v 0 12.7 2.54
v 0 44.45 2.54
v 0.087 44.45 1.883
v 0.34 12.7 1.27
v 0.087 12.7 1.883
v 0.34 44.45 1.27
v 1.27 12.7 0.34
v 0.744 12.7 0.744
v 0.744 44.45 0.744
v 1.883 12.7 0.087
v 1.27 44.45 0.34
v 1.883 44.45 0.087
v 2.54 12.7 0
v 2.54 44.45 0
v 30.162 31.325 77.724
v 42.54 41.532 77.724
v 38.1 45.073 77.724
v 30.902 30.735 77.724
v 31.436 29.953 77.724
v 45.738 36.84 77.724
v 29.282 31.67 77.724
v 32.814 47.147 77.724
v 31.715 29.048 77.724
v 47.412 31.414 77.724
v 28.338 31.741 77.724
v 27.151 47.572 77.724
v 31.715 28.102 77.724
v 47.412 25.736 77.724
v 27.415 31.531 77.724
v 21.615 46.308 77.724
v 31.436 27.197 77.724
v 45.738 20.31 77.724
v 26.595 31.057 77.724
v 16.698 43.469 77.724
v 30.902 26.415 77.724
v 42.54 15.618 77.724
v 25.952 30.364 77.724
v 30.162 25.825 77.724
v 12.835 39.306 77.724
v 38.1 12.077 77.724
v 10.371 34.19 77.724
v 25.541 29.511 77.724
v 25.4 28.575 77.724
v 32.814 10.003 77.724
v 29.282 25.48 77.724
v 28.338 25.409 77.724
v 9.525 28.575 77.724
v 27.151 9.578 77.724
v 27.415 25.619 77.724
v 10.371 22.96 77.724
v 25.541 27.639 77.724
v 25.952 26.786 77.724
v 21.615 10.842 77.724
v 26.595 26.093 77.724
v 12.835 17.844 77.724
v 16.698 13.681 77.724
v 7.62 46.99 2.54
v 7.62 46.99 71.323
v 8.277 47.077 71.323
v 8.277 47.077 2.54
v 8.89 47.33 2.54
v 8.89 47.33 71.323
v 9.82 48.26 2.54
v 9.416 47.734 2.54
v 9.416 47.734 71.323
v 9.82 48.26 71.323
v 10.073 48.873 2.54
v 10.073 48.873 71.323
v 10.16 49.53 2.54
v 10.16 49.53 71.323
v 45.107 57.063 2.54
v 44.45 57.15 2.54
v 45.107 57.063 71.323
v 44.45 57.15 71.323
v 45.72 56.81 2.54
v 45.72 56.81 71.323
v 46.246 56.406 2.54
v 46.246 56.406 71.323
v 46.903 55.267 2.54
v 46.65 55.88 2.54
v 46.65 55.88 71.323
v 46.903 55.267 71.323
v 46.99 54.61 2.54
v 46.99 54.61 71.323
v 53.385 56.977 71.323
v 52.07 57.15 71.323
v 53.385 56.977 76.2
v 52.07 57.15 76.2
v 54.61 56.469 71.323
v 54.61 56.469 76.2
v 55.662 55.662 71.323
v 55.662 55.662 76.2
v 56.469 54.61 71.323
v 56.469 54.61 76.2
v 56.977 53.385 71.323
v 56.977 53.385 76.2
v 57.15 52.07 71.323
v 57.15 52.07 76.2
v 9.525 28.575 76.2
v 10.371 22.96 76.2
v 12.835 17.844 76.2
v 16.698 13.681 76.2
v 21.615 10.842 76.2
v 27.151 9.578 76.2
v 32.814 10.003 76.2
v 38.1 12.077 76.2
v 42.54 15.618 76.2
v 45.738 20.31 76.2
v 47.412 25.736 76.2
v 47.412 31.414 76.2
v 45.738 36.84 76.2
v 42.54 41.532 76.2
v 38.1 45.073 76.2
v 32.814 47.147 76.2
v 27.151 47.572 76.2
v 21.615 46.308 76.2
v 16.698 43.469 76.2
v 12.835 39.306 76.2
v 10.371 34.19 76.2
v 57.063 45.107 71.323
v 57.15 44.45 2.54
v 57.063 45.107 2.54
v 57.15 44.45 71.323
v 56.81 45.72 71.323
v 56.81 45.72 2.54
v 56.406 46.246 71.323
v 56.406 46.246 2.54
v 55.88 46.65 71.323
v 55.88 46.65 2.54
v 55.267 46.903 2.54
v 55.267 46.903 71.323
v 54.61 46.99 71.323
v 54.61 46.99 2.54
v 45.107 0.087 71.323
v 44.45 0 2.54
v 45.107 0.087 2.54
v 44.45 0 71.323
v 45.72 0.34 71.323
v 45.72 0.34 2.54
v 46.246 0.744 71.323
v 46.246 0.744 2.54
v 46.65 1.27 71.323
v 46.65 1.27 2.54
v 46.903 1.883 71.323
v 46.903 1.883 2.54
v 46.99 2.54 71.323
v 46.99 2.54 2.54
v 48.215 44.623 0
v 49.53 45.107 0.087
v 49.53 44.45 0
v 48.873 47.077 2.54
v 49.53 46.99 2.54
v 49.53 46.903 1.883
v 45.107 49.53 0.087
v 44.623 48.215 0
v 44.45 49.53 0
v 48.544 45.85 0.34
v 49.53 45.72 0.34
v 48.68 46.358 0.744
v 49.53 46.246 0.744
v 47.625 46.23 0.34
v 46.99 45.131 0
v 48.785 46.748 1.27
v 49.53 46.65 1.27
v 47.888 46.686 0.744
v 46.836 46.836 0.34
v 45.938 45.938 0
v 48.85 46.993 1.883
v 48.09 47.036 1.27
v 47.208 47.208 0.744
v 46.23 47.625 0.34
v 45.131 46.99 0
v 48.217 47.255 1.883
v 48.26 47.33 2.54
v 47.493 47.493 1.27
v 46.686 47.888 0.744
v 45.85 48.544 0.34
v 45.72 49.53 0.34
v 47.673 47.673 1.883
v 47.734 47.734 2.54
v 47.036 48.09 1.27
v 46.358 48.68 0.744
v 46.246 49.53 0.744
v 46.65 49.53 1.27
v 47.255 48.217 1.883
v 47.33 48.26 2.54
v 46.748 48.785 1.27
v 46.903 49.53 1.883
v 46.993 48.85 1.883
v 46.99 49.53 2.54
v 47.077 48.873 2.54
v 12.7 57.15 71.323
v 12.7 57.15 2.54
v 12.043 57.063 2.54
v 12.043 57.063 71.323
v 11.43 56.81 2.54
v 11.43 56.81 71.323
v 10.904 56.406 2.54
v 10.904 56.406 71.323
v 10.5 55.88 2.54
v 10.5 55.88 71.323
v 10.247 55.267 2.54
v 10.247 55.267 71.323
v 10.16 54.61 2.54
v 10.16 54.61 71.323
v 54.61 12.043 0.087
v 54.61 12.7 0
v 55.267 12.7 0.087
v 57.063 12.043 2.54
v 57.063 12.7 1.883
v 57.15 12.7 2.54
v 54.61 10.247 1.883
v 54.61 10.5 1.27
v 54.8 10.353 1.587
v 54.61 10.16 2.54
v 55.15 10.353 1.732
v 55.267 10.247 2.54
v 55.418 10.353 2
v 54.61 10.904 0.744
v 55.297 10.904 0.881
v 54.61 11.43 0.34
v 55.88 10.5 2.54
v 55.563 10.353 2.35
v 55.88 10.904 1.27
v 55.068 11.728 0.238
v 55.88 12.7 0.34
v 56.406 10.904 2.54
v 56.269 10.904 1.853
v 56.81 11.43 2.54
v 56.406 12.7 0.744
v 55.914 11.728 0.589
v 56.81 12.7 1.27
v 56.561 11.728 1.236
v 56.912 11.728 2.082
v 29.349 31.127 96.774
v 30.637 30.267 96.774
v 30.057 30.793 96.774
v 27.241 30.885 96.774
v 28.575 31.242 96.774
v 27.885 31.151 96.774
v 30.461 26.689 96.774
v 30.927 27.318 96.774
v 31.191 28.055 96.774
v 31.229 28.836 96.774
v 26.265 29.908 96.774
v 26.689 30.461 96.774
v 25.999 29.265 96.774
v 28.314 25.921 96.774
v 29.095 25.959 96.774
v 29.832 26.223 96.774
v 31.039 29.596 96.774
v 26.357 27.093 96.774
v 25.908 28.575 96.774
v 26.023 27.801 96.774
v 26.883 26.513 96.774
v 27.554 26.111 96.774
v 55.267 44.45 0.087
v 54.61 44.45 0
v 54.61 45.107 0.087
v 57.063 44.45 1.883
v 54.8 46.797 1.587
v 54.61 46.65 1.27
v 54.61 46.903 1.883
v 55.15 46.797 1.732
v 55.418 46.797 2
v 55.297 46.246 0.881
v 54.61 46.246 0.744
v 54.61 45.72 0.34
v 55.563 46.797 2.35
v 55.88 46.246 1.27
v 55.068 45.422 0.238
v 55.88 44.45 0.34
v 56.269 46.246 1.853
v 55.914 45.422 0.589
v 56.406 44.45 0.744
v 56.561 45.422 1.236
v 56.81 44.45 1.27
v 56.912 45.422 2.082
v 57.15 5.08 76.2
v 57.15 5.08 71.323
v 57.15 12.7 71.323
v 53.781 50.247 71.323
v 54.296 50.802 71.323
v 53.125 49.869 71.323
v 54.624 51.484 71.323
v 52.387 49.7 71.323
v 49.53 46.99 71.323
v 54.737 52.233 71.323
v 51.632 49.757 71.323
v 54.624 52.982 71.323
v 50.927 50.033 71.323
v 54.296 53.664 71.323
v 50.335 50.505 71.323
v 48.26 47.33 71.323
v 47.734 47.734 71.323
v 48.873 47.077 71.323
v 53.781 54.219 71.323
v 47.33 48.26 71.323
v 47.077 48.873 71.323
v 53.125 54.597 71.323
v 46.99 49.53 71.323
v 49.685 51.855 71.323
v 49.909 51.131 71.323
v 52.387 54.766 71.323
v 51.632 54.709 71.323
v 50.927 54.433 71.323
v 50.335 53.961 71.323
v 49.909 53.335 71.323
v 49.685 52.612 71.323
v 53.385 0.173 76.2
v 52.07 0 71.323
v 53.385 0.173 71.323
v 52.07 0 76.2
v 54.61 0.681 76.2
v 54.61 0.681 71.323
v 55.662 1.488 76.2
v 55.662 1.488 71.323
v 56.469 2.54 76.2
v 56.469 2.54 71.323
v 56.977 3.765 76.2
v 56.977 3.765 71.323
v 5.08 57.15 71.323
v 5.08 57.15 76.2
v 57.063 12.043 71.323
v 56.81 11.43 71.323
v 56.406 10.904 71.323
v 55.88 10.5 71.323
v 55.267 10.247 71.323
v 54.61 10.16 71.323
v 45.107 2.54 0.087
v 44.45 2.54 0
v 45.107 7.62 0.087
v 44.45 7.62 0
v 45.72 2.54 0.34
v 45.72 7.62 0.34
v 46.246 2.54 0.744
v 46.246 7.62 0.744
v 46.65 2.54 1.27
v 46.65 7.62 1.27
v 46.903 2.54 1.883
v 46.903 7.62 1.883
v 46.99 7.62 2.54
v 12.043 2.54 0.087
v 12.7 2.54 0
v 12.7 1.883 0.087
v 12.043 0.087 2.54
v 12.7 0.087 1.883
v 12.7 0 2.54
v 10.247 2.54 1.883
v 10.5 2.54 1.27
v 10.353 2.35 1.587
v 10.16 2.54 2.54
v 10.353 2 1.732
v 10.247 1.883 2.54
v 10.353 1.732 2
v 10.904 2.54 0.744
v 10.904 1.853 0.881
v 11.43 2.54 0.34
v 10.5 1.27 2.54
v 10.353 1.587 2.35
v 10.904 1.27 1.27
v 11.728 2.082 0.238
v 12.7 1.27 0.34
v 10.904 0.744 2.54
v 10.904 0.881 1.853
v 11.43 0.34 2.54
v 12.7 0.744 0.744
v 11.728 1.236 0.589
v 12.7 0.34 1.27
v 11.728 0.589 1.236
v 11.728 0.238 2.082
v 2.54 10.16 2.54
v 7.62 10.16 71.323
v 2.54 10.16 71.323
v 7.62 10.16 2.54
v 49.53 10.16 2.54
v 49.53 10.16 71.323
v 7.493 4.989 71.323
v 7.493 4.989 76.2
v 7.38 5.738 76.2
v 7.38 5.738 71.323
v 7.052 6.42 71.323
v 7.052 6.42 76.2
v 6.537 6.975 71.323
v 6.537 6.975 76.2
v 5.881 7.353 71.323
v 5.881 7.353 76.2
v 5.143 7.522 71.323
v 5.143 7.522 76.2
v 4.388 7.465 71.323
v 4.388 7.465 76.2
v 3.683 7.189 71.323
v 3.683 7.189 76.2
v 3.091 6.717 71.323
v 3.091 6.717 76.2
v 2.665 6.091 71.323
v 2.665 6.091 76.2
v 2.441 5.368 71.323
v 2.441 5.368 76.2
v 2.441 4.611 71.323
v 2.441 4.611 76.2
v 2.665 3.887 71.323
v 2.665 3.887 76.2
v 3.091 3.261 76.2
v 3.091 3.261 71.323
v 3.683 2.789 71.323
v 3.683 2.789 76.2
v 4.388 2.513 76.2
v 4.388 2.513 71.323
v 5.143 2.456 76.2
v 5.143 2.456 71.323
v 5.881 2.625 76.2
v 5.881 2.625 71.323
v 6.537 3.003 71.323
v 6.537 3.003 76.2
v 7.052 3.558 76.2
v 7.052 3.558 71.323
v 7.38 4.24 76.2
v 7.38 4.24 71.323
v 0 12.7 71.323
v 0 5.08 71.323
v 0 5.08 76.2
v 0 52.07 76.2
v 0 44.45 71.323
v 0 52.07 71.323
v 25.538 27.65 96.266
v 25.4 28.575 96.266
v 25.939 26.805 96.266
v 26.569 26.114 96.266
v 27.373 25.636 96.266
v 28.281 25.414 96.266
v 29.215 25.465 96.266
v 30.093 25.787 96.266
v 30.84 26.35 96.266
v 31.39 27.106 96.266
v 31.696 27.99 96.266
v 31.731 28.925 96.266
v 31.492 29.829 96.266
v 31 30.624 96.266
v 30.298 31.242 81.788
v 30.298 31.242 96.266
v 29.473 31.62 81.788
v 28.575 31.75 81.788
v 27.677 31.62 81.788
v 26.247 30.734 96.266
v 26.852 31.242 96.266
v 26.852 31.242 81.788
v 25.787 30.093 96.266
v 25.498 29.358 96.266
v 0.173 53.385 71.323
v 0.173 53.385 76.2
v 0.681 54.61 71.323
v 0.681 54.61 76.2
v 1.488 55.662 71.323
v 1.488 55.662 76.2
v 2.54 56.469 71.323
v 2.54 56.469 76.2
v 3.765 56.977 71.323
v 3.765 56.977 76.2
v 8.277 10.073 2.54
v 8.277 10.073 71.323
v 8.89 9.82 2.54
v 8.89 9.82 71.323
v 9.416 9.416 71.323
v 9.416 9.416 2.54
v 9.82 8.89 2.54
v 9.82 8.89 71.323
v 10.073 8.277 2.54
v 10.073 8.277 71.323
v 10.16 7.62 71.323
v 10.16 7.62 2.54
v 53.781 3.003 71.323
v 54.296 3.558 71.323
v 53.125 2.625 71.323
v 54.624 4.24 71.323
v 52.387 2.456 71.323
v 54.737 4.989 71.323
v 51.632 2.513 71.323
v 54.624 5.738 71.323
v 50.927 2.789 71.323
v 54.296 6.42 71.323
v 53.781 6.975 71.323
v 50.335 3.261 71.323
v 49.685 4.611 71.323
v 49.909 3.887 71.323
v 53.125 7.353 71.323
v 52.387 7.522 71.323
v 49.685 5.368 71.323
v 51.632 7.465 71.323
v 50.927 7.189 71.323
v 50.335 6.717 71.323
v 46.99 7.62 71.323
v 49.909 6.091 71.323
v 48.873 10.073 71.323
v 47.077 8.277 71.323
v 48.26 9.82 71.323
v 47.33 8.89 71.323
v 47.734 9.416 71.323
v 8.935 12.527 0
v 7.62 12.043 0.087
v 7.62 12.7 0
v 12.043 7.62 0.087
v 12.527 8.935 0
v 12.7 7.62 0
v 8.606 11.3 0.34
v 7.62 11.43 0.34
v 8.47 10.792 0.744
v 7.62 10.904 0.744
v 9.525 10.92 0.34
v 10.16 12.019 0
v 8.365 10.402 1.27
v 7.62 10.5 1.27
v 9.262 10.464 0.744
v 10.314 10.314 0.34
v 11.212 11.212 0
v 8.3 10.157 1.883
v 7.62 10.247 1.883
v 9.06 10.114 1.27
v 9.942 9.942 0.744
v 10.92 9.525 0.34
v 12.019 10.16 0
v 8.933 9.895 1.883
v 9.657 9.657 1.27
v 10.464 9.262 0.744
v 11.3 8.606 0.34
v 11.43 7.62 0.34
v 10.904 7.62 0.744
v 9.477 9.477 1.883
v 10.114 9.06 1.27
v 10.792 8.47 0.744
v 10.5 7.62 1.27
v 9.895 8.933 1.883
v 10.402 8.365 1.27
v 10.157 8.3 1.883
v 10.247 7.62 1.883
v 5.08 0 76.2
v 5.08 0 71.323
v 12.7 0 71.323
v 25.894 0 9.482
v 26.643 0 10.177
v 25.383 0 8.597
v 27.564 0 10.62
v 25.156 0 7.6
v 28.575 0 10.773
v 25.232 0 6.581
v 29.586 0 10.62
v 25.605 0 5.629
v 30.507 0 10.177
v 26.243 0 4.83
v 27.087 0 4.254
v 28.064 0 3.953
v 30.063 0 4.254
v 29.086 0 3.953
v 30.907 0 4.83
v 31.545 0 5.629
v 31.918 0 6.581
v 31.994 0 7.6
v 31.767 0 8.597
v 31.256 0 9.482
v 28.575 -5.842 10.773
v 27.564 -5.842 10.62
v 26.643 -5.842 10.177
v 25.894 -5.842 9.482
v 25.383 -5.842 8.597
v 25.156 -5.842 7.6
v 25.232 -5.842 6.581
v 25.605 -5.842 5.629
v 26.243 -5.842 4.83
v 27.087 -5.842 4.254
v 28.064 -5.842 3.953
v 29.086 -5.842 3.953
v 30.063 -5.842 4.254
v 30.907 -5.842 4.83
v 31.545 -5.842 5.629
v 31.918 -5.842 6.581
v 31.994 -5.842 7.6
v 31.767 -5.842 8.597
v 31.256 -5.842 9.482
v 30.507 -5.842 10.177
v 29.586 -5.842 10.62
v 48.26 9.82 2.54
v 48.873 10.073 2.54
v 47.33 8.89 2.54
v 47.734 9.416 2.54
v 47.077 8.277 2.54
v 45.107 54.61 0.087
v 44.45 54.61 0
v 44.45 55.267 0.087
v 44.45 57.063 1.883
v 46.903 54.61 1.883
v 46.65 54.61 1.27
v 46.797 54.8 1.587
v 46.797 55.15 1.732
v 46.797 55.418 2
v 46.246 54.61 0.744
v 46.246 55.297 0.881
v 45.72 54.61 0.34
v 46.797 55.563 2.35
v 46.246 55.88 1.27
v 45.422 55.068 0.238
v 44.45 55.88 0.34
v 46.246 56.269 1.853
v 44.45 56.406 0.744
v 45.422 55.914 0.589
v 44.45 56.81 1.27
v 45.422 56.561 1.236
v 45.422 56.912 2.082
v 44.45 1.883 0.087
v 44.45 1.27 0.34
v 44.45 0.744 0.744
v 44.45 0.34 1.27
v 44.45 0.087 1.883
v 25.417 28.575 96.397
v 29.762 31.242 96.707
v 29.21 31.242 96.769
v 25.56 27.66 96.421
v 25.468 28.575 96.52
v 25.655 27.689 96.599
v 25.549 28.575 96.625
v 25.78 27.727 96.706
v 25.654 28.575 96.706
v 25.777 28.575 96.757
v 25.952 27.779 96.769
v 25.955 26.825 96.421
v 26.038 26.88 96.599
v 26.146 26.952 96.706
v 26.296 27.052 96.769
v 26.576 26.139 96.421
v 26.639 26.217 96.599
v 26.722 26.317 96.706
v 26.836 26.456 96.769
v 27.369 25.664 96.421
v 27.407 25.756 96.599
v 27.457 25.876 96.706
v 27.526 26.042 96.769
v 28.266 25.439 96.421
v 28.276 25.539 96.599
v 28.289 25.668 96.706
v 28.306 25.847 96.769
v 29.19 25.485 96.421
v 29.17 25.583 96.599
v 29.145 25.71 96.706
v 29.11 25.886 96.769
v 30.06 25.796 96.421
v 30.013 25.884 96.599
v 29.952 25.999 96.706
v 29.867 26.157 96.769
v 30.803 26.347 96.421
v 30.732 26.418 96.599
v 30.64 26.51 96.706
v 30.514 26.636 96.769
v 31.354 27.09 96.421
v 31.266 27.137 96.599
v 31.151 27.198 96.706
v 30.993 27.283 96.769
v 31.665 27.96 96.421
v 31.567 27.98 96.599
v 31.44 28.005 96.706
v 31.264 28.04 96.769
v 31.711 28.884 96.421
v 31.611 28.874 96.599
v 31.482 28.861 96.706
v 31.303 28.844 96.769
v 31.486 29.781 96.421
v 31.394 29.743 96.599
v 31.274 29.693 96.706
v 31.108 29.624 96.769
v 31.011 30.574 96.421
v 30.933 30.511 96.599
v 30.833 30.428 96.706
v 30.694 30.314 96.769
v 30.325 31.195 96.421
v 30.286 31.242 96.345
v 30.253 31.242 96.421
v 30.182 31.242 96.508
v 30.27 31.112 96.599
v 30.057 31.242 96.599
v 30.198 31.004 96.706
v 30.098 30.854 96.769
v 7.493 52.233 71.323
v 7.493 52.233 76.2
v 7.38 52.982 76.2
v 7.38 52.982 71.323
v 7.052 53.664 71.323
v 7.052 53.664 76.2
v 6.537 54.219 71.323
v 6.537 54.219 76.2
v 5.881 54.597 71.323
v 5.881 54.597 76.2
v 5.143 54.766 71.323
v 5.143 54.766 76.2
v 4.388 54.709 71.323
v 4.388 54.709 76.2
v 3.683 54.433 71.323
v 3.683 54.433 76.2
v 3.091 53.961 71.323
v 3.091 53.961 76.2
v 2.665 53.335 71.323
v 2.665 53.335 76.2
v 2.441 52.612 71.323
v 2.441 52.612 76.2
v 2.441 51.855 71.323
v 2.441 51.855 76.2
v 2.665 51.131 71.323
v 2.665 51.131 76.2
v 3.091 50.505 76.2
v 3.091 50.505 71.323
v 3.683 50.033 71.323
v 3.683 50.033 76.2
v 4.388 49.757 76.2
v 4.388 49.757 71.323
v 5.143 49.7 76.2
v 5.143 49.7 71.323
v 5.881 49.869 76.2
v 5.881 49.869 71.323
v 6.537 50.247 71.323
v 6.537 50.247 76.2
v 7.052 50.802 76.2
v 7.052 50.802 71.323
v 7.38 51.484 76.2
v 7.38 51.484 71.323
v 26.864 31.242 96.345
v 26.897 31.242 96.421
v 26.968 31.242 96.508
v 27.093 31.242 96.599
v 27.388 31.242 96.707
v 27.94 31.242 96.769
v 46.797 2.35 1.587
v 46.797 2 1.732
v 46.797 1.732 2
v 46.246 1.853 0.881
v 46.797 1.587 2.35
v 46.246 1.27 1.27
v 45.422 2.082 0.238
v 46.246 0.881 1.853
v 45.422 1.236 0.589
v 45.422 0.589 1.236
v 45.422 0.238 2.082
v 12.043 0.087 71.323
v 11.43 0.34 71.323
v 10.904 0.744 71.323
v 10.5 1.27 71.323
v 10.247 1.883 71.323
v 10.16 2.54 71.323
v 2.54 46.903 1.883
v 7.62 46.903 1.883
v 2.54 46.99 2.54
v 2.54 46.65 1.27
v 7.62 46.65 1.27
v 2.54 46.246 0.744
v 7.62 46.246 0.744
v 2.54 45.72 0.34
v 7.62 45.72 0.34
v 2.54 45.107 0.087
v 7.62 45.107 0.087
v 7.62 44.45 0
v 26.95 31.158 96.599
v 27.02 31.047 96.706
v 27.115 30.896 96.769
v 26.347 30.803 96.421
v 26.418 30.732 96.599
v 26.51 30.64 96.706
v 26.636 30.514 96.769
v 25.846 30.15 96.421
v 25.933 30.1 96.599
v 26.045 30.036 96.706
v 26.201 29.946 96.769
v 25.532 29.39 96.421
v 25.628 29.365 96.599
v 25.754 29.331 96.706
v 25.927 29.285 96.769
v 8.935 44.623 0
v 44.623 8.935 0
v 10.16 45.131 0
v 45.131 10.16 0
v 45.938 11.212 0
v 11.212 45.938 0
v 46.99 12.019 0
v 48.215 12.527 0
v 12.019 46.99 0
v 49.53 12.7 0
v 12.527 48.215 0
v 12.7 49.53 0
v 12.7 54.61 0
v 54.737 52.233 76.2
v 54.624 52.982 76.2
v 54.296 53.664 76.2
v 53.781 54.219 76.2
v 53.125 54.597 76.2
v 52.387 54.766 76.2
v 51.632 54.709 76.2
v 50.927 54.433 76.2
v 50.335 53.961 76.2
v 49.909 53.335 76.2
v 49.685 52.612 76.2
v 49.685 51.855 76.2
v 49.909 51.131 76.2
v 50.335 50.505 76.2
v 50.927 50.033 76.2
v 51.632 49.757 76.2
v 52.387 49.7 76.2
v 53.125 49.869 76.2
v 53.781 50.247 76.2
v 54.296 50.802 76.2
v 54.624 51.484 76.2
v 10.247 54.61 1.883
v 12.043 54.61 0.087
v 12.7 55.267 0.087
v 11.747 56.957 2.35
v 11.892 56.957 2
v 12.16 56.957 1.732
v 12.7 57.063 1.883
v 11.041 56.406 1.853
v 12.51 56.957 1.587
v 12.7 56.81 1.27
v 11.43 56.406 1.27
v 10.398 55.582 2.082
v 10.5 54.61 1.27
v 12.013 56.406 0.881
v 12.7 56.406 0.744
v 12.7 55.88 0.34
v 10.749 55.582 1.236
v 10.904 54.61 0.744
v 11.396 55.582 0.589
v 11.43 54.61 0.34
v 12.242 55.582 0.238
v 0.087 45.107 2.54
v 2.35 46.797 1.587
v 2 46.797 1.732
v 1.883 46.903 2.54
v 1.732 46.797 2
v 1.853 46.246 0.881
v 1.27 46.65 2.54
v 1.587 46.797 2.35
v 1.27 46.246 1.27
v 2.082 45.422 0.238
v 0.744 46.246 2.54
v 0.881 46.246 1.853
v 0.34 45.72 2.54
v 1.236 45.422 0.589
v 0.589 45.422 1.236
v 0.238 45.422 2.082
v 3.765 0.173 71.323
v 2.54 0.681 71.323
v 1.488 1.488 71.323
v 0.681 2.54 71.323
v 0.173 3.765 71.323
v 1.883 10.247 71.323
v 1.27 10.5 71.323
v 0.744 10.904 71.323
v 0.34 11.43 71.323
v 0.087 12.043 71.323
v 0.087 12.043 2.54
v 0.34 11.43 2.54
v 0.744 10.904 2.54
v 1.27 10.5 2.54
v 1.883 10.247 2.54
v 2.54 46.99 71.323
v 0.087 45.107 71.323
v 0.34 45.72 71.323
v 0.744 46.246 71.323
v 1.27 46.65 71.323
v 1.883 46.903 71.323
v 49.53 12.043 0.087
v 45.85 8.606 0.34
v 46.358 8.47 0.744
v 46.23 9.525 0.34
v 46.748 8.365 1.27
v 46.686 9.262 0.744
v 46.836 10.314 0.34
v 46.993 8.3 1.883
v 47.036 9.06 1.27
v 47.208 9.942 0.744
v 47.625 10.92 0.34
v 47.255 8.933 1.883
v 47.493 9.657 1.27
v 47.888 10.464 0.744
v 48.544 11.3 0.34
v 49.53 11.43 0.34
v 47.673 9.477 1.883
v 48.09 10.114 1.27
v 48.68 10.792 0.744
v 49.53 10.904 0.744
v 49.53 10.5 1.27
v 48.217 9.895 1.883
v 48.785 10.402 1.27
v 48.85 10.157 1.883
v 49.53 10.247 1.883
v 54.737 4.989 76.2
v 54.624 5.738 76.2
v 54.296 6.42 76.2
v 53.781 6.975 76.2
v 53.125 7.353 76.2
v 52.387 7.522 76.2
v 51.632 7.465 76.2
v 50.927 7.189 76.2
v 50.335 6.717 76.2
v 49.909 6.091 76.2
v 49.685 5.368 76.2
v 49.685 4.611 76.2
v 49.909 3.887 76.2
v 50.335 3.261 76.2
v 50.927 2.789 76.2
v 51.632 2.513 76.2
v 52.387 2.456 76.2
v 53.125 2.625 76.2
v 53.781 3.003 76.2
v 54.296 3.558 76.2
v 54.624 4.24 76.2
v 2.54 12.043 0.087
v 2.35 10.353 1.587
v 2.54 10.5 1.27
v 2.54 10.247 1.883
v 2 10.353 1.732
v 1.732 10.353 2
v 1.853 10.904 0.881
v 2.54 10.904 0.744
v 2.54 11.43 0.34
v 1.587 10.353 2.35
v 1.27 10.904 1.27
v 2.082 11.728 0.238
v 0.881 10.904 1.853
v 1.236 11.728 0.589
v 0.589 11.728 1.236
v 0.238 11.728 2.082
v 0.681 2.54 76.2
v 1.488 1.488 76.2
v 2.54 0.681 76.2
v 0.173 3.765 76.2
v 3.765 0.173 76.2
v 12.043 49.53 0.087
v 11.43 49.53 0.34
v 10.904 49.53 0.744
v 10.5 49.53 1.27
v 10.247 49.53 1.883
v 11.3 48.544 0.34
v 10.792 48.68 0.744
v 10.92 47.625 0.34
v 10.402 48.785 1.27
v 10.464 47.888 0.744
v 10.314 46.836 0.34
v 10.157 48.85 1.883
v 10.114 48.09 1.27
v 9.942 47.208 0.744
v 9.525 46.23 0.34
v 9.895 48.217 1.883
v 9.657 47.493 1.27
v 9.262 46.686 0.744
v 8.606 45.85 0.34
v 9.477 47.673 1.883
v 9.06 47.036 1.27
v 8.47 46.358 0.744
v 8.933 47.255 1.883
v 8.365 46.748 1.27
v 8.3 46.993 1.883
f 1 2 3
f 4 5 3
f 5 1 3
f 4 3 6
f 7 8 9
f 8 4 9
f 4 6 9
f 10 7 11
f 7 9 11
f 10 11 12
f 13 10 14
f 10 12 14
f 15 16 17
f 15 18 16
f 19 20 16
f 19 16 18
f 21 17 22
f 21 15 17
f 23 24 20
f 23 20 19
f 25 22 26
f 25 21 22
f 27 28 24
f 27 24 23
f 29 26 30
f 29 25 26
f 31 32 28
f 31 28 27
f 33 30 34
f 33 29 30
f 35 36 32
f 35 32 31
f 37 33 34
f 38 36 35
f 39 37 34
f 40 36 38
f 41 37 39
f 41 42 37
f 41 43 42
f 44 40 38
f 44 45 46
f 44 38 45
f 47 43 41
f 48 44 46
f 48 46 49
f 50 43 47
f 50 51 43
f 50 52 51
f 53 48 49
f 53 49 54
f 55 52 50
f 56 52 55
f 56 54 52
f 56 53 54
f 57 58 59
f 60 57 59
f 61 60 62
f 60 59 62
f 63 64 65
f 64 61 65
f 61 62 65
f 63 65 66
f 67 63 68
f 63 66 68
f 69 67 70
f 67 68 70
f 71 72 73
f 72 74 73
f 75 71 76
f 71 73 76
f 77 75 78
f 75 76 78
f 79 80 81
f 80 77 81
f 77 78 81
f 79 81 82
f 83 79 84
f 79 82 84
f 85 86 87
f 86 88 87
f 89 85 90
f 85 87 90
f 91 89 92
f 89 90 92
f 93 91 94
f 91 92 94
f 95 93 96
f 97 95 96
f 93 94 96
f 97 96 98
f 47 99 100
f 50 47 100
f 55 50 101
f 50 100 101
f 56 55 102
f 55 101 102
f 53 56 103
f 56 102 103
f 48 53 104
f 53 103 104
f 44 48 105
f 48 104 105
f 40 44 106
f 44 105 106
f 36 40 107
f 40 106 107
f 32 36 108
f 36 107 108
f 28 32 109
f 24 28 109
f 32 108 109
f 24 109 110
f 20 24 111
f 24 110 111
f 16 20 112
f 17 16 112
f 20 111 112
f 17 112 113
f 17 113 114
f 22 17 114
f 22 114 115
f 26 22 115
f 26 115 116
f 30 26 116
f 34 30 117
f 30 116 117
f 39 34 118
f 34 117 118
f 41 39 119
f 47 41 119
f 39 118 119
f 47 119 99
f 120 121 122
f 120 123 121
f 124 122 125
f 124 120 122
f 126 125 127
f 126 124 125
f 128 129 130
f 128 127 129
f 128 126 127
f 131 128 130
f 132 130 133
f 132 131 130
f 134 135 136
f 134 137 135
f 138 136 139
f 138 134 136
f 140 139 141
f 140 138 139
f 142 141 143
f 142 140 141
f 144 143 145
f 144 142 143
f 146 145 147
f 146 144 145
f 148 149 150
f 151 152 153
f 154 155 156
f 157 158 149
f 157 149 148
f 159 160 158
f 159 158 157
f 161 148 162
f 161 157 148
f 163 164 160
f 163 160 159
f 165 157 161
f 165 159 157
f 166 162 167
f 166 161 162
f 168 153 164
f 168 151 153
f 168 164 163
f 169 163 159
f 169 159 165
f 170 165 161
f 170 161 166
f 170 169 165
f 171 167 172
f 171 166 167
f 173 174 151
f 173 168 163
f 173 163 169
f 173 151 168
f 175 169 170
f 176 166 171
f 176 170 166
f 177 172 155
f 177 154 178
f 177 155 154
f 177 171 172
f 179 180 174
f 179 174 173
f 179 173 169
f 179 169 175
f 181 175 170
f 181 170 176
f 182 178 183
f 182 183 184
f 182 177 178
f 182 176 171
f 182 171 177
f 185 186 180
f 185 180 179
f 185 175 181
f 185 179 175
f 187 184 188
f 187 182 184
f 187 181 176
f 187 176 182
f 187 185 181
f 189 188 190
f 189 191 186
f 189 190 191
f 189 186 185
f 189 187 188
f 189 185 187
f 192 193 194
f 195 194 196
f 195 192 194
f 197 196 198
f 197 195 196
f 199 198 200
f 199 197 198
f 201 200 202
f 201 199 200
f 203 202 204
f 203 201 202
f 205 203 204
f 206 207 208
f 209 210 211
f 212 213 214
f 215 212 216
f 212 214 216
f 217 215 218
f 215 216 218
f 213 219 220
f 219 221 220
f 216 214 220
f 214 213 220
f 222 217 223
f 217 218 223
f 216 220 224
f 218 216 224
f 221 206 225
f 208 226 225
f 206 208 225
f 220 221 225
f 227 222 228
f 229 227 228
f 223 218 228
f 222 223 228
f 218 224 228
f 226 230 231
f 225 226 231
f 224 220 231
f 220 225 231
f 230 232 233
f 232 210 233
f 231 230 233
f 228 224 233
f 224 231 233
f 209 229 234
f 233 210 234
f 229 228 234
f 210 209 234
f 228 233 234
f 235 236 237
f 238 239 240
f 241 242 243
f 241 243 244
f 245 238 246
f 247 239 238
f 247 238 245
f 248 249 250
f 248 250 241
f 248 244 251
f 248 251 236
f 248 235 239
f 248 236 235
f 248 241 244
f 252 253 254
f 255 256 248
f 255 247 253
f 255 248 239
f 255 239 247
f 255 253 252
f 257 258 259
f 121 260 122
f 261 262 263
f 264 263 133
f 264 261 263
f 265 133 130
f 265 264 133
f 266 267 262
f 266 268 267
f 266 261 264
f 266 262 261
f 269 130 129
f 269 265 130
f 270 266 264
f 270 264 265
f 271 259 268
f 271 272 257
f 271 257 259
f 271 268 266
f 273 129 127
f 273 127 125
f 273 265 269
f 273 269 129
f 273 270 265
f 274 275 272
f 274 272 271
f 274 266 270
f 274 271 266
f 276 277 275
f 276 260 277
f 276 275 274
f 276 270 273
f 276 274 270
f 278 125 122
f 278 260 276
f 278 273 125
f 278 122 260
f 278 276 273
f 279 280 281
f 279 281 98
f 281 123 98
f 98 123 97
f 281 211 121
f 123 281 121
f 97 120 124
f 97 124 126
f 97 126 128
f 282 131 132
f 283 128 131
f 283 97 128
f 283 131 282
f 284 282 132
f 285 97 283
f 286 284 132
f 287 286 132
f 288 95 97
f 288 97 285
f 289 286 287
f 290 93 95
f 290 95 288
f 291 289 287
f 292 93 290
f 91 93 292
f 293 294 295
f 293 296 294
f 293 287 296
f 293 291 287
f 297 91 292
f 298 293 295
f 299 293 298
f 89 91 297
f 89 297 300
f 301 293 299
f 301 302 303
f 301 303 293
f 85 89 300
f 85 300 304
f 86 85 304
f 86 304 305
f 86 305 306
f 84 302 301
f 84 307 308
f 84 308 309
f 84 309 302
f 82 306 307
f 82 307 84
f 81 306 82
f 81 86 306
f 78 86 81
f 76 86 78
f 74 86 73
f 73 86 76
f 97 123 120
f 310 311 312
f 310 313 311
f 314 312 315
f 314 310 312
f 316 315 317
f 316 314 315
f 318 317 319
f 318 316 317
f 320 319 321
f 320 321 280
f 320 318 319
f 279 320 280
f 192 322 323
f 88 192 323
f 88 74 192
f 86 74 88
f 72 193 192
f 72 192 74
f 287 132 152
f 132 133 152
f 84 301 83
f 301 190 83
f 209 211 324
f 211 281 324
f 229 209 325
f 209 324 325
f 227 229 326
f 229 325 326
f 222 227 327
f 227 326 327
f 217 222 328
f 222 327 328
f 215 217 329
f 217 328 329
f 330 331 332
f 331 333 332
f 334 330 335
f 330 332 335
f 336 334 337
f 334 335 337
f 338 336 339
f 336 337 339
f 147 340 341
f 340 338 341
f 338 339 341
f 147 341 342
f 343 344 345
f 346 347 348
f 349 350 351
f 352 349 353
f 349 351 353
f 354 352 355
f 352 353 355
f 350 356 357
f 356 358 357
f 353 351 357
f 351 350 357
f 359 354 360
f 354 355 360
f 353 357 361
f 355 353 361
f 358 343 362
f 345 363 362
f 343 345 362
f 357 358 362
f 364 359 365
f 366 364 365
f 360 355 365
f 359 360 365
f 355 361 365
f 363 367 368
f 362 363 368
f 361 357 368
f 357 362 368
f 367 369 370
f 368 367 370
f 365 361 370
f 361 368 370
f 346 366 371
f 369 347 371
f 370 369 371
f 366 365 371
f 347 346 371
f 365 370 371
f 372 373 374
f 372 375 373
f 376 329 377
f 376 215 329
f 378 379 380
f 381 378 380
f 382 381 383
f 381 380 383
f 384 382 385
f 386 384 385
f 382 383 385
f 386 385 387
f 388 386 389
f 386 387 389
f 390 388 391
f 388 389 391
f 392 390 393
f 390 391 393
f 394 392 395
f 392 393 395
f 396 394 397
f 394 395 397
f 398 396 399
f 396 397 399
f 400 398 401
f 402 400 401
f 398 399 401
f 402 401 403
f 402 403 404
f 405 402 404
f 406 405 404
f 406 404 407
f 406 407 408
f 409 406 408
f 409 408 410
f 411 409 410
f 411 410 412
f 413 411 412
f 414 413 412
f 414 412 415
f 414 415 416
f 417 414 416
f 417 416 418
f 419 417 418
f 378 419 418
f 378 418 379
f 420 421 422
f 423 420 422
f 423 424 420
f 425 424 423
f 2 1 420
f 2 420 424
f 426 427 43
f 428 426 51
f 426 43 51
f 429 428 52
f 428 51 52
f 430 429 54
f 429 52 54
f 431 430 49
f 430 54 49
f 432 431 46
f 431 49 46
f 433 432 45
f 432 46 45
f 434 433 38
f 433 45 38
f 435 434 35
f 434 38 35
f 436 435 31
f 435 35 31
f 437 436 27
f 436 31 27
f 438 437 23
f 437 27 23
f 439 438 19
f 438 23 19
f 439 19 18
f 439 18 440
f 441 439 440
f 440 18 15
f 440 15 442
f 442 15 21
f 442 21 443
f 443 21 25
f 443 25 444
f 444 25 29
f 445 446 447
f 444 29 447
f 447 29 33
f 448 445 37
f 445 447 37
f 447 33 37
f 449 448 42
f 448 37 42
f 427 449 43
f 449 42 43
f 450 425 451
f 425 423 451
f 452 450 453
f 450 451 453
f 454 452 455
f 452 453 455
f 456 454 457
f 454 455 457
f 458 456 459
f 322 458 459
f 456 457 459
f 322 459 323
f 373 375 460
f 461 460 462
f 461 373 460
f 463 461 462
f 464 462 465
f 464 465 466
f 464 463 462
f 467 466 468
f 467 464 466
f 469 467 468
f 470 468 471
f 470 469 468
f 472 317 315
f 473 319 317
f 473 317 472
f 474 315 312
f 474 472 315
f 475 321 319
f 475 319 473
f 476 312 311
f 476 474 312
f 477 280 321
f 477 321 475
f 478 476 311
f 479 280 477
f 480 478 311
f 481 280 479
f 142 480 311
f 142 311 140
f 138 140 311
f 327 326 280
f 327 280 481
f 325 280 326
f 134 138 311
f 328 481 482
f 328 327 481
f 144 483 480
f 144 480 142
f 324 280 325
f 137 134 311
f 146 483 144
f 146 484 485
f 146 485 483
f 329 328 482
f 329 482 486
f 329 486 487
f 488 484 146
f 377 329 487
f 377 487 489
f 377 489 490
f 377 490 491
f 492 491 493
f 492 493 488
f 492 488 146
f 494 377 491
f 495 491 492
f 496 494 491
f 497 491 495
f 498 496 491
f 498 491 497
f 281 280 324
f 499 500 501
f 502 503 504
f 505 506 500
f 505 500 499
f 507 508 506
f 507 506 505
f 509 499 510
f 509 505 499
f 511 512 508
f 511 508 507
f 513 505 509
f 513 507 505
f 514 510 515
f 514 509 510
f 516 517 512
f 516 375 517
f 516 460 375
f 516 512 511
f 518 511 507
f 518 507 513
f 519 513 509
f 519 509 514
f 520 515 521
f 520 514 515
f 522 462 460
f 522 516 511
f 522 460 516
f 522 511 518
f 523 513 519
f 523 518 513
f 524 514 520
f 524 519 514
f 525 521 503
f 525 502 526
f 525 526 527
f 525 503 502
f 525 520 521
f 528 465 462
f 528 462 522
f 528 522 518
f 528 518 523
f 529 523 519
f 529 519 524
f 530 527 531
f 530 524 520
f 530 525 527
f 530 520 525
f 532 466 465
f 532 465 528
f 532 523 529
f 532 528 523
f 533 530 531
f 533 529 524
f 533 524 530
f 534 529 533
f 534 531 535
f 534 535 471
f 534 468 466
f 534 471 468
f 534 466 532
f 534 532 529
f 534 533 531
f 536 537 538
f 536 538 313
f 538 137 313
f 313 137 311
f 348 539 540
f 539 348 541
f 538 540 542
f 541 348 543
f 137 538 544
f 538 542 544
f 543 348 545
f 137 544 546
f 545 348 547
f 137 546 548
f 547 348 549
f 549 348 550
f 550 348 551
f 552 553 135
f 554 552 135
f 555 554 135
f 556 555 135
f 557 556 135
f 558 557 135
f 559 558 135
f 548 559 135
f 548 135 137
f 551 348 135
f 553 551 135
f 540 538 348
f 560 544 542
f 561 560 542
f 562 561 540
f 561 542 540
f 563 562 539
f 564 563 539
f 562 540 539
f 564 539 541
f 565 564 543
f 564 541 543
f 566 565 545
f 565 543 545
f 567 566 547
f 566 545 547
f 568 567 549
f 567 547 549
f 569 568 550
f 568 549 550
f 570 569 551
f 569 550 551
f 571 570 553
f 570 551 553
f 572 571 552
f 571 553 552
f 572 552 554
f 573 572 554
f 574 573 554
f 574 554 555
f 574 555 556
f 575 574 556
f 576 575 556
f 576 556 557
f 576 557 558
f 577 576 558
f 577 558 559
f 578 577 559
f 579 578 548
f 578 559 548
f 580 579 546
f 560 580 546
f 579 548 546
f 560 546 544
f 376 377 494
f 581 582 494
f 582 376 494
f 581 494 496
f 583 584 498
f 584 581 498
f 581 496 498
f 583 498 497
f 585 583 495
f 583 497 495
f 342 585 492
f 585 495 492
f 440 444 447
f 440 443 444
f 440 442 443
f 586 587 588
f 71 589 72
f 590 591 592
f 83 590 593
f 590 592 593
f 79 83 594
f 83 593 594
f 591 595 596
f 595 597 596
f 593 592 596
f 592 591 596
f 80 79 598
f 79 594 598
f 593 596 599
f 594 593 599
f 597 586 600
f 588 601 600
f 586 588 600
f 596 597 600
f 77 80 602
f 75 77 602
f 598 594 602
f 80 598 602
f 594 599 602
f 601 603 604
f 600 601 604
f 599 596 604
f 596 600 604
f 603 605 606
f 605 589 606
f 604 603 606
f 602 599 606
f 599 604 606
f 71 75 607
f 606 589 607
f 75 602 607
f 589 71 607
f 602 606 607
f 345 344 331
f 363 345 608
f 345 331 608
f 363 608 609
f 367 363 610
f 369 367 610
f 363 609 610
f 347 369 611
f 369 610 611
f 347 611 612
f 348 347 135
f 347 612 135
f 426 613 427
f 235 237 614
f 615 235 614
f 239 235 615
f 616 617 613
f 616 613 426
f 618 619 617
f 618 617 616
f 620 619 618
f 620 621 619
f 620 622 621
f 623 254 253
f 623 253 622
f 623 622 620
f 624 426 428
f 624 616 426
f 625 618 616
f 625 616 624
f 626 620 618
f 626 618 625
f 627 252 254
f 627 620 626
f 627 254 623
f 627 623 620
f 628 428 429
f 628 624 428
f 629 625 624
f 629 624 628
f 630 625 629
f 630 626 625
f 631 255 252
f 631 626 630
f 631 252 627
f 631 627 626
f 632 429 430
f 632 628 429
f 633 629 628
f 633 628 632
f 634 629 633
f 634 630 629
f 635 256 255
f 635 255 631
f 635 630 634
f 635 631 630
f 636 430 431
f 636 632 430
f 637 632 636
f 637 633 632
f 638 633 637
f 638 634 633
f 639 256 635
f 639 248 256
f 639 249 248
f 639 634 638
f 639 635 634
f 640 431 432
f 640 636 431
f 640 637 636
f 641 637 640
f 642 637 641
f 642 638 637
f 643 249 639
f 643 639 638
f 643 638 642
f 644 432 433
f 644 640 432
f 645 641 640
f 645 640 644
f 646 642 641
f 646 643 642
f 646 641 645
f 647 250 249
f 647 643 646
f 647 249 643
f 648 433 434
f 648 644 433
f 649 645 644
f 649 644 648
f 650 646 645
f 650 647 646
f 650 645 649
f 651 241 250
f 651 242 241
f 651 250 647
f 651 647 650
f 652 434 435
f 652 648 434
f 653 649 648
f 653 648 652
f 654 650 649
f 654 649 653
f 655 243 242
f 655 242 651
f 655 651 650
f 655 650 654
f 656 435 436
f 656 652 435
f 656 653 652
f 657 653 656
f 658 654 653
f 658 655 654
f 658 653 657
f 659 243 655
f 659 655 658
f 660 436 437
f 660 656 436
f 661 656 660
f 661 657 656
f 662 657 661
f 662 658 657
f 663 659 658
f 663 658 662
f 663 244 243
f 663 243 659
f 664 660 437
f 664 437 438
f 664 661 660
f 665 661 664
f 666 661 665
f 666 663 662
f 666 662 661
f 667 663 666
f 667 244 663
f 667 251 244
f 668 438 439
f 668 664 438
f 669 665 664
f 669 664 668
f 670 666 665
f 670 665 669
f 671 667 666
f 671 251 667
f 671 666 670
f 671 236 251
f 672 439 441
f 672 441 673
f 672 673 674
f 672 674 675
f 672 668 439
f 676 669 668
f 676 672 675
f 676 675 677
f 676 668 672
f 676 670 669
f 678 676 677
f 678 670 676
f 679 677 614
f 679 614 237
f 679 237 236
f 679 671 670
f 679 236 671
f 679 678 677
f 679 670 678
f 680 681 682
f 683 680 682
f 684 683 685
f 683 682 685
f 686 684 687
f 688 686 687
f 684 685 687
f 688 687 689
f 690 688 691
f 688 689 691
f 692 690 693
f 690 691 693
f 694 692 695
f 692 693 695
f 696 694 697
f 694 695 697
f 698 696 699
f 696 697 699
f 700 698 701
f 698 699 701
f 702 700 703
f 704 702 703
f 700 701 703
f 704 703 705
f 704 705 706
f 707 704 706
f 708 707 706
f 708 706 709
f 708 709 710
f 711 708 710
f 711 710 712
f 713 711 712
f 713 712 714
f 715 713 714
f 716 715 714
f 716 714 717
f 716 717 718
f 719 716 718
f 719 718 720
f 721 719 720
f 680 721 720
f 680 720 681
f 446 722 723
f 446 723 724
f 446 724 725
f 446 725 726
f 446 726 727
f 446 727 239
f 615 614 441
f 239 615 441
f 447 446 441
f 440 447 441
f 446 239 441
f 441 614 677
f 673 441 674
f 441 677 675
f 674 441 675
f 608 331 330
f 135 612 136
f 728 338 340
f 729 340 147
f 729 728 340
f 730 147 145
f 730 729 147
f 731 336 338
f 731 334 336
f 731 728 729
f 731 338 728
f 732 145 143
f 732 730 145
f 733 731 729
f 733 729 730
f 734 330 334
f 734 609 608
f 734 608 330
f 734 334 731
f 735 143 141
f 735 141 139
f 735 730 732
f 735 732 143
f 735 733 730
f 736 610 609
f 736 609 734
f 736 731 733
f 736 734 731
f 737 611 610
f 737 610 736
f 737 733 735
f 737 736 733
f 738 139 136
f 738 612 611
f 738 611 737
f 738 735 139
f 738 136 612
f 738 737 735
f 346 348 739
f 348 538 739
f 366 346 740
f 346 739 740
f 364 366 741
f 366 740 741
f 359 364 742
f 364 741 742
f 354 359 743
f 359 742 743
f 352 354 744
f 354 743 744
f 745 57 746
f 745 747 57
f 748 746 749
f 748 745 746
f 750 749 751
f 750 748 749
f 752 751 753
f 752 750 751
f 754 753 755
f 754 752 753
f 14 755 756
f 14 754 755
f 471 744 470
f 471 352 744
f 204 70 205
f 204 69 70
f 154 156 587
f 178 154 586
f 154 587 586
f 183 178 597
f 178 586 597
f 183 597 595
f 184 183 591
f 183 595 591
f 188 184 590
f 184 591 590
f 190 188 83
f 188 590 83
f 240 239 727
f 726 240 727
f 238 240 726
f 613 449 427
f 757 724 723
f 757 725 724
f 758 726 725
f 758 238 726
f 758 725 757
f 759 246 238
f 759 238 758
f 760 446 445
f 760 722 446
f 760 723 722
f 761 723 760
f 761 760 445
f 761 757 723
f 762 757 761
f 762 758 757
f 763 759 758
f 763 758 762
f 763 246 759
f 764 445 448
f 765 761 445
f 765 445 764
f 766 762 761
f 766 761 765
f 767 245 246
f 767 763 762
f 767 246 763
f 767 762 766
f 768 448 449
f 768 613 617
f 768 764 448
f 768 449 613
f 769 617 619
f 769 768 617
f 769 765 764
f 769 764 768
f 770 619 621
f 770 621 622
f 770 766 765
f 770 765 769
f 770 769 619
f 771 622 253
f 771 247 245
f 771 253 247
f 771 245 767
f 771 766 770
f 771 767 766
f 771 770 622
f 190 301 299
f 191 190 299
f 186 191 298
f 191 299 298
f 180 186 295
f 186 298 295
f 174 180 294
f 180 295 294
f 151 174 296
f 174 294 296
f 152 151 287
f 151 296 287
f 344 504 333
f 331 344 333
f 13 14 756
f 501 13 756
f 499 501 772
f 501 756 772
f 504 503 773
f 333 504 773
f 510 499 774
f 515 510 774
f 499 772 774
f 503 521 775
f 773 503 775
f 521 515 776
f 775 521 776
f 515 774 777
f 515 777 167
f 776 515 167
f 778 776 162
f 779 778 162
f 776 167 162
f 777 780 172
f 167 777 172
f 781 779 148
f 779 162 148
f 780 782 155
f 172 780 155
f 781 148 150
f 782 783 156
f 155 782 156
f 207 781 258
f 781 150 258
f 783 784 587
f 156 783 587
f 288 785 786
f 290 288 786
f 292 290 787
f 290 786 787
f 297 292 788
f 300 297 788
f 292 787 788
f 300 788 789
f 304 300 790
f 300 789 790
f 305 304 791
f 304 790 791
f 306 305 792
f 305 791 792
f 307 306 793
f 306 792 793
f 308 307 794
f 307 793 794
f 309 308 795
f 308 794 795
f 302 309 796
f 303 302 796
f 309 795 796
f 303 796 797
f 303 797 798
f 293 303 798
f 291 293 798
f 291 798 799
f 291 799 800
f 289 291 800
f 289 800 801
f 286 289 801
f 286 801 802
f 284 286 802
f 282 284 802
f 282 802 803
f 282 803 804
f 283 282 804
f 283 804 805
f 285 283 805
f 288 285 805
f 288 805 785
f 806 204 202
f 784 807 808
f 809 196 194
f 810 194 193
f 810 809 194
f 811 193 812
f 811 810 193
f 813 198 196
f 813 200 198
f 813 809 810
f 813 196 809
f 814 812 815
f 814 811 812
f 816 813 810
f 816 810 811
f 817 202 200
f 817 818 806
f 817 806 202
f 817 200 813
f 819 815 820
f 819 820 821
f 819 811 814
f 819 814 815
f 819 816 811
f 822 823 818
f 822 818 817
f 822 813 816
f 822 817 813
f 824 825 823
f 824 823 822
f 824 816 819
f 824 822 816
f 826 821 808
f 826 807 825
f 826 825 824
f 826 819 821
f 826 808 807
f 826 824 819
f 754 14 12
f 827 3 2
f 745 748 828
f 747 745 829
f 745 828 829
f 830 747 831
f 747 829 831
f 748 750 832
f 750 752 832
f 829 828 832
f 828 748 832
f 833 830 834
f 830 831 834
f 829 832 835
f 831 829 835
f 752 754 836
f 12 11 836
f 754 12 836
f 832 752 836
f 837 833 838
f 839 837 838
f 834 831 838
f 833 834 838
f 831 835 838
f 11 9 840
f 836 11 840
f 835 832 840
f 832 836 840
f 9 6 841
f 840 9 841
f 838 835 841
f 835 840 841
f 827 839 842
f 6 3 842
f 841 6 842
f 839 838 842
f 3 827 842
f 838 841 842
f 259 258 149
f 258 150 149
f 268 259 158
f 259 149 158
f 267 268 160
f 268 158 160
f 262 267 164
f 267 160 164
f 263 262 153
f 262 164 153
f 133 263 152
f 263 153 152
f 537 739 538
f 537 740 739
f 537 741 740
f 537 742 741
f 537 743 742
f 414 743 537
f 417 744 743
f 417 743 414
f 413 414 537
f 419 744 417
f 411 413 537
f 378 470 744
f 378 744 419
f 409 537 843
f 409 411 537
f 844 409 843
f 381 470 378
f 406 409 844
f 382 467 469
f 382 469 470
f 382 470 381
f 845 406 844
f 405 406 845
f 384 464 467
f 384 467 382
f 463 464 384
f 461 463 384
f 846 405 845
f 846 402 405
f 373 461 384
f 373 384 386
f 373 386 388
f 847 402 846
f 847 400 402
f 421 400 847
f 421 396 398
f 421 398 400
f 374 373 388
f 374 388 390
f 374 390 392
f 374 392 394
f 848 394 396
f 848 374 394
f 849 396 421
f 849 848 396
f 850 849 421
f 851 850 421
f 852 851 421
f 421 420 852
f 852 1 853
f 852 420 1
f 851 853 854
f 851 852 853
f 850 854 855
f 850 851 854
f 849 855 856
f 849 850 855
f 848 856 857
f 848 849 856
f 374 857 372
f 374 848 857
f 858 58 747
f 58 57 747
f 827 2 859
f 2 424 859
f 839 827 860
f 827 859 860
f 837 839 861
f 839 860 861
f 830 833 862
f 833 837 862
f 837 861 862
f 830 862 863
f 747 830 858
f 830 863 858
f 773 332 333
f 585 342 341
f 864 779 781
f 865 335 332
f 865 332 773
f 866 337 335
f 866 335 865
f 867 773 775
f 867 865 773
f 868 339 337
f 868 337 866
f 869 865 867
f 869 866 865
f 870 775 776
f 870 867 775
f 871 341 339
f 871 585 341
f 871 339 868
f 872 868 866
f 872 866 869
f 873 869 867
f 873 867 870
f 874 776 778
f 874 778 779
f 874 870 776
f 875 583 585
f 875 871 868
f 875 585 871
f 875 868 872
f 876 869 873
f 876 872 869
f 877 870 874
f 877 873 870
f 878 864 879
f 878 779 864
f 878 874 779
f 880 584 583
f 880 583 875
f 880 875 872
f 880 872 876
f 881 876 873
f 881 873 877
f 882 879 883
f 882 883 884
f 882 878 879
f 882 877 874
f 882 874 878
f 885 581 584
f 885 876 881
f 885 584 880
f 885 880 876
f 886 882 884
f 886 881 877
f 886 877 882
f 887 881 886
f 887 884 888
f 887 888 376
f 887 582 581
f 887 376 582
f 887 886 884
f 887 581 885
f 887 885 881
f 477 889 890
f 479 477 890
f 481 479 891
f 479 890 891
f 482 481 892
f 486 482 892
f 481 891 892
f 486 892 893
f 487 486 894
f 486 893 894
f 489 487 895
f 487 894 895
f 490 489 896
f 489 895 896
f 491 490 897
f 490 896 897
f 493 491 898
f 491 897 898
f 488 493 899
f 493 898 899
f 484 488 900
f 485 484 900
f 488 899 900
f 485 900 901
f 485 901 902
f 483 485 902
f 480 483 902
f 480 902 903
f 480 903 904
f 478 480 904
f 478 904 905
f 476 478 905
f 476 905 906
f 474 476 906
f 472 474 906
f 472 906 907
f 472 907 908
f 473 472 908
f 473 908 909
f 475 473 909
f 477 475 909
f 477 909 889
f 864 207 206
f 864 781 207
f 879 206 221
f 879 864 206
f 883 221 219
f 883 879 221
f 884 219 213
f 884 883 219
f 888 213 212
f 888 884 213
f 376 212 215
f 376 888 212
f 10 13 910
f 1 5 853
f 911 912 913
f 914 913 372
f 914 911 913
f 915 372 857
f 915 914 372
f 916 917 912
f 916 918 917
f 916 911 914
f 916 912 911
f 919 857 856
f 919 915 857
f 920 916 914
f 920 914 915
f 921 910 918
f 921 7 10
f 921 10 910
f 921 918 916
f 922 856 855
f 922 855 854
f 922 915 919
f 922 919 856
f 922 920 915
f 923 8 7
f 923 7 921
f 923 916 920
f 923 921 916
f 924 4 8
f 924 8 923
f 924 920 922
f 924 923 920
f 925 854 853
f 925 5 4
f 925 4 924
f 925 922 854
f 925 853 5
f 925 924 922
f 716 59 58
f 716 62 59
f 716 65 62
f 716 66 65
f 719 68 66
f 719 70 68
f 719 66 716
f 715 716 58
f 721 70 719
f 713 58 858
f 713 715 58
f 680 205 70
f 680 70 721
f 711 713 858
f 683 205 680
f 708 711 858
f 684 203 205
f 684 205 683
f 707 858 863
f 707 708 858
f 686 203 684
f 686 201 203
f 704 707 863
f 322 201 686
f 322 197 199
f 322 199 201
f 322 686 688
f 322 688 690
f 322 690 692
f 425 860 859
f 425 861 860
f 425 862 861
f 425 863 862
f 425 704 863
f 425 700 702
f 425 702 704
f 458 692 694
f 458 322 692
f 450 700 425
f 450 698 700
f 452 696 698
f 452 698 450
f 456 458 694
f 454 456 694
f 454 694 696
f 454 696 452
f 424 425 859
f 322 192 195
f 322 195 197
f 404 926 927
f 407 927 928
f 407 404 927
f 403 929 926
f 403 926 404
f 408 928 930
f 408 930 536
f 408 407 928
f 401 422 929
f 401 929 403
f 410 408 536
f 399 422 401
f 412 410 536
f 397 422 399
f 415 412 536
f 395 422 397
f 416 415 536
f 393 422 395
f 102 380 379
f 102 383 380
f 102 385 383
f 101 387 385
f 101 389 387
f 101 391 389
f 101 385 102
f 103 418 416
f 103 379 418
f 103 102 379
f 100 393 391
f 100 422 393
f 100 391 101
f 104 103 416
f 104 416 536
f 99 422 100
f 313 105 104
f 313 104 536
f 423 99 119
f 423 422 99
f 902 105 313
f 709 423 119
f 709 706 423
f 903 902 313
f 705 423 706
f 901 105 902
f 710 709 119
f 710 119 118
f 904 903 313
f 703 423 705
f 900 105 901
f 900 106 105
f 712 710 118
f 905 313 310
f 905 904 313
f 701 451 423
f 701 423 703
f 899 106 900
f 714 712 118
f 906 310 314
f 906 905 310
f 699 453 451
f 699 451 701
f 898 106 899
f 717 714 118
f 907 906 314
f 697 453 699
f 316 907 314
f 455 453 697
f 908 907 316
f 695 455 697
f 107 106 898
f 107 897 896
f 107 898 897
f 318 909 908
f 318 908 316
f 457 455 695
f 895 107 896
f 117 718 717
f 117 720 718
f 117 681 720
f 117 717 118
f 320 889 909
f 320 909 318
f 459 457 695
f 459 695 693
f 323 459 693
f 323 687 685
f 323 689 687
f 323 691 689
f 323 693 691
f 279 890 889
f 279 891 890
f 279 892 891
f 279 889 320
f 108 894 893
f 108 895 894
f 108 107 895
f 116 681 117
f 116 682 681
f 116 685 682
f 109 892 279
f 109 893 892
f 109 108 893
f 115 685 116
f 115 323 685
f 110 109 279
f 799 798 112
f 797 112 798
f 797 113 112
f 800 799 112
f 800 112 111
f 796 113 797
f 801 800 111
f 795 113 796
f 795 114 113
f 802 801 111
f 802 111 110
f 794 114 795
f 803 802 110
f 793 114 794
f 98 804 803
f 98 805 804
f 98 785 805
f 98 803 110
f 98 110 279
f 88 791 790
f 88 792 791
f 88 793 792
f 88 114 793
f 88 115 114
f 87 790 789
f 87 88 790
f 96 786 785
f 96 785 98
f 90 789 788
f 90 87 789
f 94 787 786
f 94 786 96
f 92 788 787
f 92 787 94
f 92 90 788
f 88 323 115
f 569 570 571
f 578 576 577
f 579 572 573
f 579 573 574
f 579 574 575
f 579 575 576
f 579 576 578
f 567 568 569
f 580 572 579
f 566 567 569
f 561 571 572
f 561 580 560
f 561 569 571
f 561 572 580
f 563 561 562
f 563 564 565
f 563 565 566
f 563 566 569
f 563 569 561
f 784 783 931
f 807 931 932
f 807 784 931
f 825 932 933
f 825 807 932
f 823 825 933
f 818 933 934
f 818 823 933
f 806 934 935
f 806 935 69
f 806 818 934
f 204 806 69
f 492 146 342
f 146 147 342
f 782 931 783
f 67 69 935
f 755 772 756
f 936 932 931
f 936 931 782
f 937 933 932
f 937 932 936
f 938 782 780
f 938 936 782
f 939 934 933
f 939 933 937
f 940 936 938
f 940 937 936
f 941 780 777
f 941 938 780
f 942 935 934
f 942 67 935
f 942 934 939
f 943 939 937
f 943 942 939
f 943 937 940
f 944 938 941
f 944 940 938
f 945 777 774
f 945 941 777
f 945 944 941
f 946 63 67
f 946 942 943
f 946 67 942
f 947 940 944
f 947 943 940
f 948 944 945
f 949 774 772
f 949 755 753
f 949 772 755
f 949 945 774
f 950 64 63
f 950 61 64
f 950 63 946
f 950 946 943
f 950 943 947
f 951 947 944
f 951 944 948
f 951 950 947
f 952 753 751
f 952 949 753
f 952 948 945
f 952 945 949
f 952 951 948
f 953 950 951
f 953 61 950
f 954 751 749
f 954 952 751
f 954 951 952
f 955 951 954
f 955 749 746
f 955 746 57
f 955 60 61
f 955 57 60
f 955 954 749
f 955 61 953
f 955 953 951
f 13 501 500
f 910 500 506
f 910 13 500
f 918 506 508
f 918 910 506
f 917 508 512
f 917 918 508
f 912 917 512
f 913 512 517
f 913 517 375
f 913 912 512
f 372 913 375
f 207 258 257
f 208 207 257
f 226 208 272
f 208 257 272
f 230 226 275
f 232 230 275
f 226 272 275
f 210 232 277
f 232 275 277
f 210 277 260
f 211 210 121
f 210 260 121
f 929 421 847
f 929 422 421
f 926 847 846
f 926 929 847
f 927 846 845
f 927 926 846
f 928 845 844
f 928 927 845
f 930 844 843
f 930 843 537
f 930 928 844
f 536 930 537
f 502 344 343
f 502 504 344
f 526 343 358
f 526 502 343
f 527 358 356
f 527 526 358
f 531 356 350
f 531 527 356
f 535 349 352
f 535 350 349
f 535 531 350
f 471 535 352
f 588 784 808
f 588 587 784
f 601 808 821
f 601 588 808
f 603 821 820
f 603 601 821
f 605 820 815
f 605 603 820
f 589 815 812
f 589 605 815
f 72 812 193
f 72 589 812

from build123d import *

# Parameters (mm, degrees)
SKETCH1_W           = 57.15
SKETCH1_H           = 57.15
BOSS_EXTRUDE1_DEPTH = 76.2
SKETCH2_R           = 19.05
BOSS_EXTRUDE2_DEPTH = 1.524
SKETCH3_R           = 3.175
BOSS_EXTRUDE3_DEPTH = 19.05
SKETCH18_W          = 20.32
SKETCH18_H          = 20.32
CUT_EXTRUDE13_DEPTH = 71.3232
SKETCH20_W          = 20.32
SKETCH20_H          = 20.32
CUT_EXTRUDE14_DEPTH = 71.3232
SKETCH21_W          = 20.32
SKETCH21_H          = 20.32
CUT_EXTRUDE15_DEPTH = 71.3232
SKETCH22_W          = 20.32
SKETCH22_H          = 20.32
CUT_EXTRUDE16_DEPTH = 71.3232
SKETCH11_R          = 2.54
CUT_EXTRUDE8_DEPTH  = 112.079633597
SKETCH12_R          = 2.54
CUT_EXTRUDE9_DEPTH  = 112.079633597
SKETCH14_R          = 2.54
CUT_EXTRUDE10_DEPTH = 112.079633597
SKETCH15_R          = 2.54
CUT_EXTRUDE11_DEPTH = 112.079633597
FILLET2_R           = 5.08
FILLET4_R           = 2.54
FILLET1_R           = 0.508
SKETCH10_W          = 7.148953117
SKETCH10_H          = 1.106198654
CUT_EXTRUDE7_DEPTH  = 14.986
SKETCH23_R          = 3.429
WIRE_2_DEPTH        = 5.842


with BuildPart() as part:
    # Sketch1 → Boss-Extrude1 (new body)
    with BuildSketch(Plane.XY):
        with Locations((28.575, 28.575)):
            Rectangle(SKETCH1_W, SKETCH1_H)
    extrude(amount=BOSS_EXTRUDE1_DEPTH)

    # Sketch2 → Boss-Extrude2 (add)
    with BuildSketch(Plane.XY.offset(76.2)):
        with Locations(Location((28.575, 28.575, 0), (0, 0, 180))):
            Circle(SKETCH2_R)
    extrude(amount=BOSS_EXTRUDE2_DEPTH)

    # Sketch3 → Boss-Extrude3 (add)
    with BuildSketch(Plane.XY.offset(77.724)):
        with Locations(Location((28.575, 28.575, 0), (0, 0, 180))):
            Circle(SKETCH3_R)
    extrude(amount=BOSS_EXTRUDE3_DEPTH)

    # Sketch18 → Cut-Extrude13 (cut)
    with BuildSketch(Plane(origin=(0, 0, 0), x_dir=(-1, 0, 0), z_dir=(0, 0, -1))):
        with Locations((0, 57.15)):
            Rectangle(SKETCH18_W, SKETCH18_H)
    extrude(amount=-CUT_EXTRUDE13_DEPTH, mode=Mode.SUBTRACT)

    # Sketch20 → Cut-Extrude14 (cut)
    with BuildSketch(Plane(origin=(0, 0, 0), x_dir=(-1, 0, 0), z_dir=(0, 0, -1))):
        Rectangle(SKETCH20_W, SKETCH20_H)
    extrude(amount=-CUT_EXTRUDE14_DEPTH, mode=Mode.SUBTRACT)

    # Sketch21 → Cut-Extrude15 (cut)
    with BuildSketch(Plane(origin=(0, 0, 0), x_dir=(-1, 0, 0), z_dir=(0, 0, -1))):
        with Locations((-57.15, 0)):
            Rectangle(SKETCH21_W, SKETCH21_H)
    extrude(amount=-CUT_EXTRUDE15_DEPTH, mode=Mode.SUBTRACT)

    # Sketch22 → Cut-Extrude16 (cut)
    with BuildSketch(Plane(origin=(0, 0, 0), x_dir=(-1, 0, 0), z_dir=(0, 0, -1))):
        with Locations((-57.15, 57.15)):
            Rectangle(SKETCH22_W, SKETCH22_H)
    extrude(amount=-CUT_EXTRUDE16_DEPTH, mode=Mode.SUBTRACT)

    # Sketch11 → Cut-Extrude8 (cut, through all)
    with BuildSketch(Plane.XY.offset(76.2)):
        with Locations((4.953, 52.233071325)):
            Circle(SKETCH11_R)
    extrude(amount=-CUT_EXTRUDE8_DEPTH, mode=Mode.SUBTRACT)

    # Sketch12 → Cut-Extrude9 (cut, through all)
    with BuildSketch(Plane.XY.offset(76.2)):
        with Locations((52.197, 52.233071325)):
            Circle(SKETCH12_R)
    extrude(amount=-CUT_EXTRUDE9_DEPTH, mode=Mode.SUBTRACT)

    # Sketch14 → Cut-Extrude10 (cut, through all)
    with BuildSketch(Plane.XY.offset(76.2)):
        with Locations((4.953, 4.989071325)):
            Circle(SKETCH14_R)
    extrude(amount=-CUT_EXTRUDE10_DEPTH, mode=Mode.SUBTRACT)

    # Sketch15 → Cut-Extrude11 (cut, through all)
    with BuildSketch(Plane.XY.offset(76.2)):
        with Locations((52.197, 4.989071325)):
            Circle(SKETCH15_R)
    extrude(amount=-CUT_EXTRUDE11_DEPTH, mode=Mode.SUBTRACT)

    # Fillet2
    fillet2_edges = [part.edges().sort_by_distance(p)[0] for p in [
        (0, 57.15, 73.7616),
        (57.15, 57.15, 73.7616),
        (57.15, 0, 73.7616),
        (0, 0, 73.7616),
    ]]
    fillet(fillet2_edges, radius=FILLET2_R)

    # Fillet4
    fillet4_edges = [part.edges().sort_by_distance(p)[0] for p in [
        (0, 28.575, 0),
        (10.16, 52.07, 0),
        (5.08, 46.99, 0),
        (0, 46.99, 35.6616),
        (10.16, 57.15, 35.6616),
        (10.16, 46.99, 35.6616),
        (28.575, 0, 0),
        (5.08, 10.16, 0),
        (10.16, 5.08, 0),
        (10.16, 0, 35.6616),
        (0, 10.16, 35.6616),
        (10.16, 10.16, 35.6616),
        (57.15, 28.575, 0),
        (46.99, 5.08, 0),
        (52.07, 10.16, 0),
        (57.15, 10.16, 35.6616),
        (46.99, 0, 35.6616),
        (46.99, 10.16, 35.6616),
        (28.575, 57.15, 0),
        (52.07, 46.99, 0),
        (46.99, 52.07, 0),
        (46.99, 57.15, 35.6616),
        (57.15, 46.99, 35.6616),
        (46.99, 46.99, 35.6616),
    ]]
    fillet(fillet4_edges, radius=FILLET4_R)

    # Fillet1
    fillet1_edges = [part.edges().sort_by_distance(p)[0] for p in [
        (31.75, 28.575, 96.774),
    ]]
    fillet(fillet1_edges, radius=FILLET1_R)

    # Sketch10 → Cut-Extrude7 (cut)
    with BuildSketch(Plane.XY.offset(96.774)):
        with Locations((29.031069878, 31.795099327)):
            Rectangle(SKETCH10_W, SKETCH10_H)
    extrude(amount=-CUT_EXTRUDE7_DEPTH, mode=Mode.SUBTRACT)

    # Sketch23 → Wire 2 (add)
    with BuildSketch(Plane.XZ):
        with Locations(Location((28.575, 7.343801428, 0), (0, 0, 90))):
            Circle(SKETCH23_R)
    extrude(amount=WIRE_2_DEPTH)


solid = part.part
